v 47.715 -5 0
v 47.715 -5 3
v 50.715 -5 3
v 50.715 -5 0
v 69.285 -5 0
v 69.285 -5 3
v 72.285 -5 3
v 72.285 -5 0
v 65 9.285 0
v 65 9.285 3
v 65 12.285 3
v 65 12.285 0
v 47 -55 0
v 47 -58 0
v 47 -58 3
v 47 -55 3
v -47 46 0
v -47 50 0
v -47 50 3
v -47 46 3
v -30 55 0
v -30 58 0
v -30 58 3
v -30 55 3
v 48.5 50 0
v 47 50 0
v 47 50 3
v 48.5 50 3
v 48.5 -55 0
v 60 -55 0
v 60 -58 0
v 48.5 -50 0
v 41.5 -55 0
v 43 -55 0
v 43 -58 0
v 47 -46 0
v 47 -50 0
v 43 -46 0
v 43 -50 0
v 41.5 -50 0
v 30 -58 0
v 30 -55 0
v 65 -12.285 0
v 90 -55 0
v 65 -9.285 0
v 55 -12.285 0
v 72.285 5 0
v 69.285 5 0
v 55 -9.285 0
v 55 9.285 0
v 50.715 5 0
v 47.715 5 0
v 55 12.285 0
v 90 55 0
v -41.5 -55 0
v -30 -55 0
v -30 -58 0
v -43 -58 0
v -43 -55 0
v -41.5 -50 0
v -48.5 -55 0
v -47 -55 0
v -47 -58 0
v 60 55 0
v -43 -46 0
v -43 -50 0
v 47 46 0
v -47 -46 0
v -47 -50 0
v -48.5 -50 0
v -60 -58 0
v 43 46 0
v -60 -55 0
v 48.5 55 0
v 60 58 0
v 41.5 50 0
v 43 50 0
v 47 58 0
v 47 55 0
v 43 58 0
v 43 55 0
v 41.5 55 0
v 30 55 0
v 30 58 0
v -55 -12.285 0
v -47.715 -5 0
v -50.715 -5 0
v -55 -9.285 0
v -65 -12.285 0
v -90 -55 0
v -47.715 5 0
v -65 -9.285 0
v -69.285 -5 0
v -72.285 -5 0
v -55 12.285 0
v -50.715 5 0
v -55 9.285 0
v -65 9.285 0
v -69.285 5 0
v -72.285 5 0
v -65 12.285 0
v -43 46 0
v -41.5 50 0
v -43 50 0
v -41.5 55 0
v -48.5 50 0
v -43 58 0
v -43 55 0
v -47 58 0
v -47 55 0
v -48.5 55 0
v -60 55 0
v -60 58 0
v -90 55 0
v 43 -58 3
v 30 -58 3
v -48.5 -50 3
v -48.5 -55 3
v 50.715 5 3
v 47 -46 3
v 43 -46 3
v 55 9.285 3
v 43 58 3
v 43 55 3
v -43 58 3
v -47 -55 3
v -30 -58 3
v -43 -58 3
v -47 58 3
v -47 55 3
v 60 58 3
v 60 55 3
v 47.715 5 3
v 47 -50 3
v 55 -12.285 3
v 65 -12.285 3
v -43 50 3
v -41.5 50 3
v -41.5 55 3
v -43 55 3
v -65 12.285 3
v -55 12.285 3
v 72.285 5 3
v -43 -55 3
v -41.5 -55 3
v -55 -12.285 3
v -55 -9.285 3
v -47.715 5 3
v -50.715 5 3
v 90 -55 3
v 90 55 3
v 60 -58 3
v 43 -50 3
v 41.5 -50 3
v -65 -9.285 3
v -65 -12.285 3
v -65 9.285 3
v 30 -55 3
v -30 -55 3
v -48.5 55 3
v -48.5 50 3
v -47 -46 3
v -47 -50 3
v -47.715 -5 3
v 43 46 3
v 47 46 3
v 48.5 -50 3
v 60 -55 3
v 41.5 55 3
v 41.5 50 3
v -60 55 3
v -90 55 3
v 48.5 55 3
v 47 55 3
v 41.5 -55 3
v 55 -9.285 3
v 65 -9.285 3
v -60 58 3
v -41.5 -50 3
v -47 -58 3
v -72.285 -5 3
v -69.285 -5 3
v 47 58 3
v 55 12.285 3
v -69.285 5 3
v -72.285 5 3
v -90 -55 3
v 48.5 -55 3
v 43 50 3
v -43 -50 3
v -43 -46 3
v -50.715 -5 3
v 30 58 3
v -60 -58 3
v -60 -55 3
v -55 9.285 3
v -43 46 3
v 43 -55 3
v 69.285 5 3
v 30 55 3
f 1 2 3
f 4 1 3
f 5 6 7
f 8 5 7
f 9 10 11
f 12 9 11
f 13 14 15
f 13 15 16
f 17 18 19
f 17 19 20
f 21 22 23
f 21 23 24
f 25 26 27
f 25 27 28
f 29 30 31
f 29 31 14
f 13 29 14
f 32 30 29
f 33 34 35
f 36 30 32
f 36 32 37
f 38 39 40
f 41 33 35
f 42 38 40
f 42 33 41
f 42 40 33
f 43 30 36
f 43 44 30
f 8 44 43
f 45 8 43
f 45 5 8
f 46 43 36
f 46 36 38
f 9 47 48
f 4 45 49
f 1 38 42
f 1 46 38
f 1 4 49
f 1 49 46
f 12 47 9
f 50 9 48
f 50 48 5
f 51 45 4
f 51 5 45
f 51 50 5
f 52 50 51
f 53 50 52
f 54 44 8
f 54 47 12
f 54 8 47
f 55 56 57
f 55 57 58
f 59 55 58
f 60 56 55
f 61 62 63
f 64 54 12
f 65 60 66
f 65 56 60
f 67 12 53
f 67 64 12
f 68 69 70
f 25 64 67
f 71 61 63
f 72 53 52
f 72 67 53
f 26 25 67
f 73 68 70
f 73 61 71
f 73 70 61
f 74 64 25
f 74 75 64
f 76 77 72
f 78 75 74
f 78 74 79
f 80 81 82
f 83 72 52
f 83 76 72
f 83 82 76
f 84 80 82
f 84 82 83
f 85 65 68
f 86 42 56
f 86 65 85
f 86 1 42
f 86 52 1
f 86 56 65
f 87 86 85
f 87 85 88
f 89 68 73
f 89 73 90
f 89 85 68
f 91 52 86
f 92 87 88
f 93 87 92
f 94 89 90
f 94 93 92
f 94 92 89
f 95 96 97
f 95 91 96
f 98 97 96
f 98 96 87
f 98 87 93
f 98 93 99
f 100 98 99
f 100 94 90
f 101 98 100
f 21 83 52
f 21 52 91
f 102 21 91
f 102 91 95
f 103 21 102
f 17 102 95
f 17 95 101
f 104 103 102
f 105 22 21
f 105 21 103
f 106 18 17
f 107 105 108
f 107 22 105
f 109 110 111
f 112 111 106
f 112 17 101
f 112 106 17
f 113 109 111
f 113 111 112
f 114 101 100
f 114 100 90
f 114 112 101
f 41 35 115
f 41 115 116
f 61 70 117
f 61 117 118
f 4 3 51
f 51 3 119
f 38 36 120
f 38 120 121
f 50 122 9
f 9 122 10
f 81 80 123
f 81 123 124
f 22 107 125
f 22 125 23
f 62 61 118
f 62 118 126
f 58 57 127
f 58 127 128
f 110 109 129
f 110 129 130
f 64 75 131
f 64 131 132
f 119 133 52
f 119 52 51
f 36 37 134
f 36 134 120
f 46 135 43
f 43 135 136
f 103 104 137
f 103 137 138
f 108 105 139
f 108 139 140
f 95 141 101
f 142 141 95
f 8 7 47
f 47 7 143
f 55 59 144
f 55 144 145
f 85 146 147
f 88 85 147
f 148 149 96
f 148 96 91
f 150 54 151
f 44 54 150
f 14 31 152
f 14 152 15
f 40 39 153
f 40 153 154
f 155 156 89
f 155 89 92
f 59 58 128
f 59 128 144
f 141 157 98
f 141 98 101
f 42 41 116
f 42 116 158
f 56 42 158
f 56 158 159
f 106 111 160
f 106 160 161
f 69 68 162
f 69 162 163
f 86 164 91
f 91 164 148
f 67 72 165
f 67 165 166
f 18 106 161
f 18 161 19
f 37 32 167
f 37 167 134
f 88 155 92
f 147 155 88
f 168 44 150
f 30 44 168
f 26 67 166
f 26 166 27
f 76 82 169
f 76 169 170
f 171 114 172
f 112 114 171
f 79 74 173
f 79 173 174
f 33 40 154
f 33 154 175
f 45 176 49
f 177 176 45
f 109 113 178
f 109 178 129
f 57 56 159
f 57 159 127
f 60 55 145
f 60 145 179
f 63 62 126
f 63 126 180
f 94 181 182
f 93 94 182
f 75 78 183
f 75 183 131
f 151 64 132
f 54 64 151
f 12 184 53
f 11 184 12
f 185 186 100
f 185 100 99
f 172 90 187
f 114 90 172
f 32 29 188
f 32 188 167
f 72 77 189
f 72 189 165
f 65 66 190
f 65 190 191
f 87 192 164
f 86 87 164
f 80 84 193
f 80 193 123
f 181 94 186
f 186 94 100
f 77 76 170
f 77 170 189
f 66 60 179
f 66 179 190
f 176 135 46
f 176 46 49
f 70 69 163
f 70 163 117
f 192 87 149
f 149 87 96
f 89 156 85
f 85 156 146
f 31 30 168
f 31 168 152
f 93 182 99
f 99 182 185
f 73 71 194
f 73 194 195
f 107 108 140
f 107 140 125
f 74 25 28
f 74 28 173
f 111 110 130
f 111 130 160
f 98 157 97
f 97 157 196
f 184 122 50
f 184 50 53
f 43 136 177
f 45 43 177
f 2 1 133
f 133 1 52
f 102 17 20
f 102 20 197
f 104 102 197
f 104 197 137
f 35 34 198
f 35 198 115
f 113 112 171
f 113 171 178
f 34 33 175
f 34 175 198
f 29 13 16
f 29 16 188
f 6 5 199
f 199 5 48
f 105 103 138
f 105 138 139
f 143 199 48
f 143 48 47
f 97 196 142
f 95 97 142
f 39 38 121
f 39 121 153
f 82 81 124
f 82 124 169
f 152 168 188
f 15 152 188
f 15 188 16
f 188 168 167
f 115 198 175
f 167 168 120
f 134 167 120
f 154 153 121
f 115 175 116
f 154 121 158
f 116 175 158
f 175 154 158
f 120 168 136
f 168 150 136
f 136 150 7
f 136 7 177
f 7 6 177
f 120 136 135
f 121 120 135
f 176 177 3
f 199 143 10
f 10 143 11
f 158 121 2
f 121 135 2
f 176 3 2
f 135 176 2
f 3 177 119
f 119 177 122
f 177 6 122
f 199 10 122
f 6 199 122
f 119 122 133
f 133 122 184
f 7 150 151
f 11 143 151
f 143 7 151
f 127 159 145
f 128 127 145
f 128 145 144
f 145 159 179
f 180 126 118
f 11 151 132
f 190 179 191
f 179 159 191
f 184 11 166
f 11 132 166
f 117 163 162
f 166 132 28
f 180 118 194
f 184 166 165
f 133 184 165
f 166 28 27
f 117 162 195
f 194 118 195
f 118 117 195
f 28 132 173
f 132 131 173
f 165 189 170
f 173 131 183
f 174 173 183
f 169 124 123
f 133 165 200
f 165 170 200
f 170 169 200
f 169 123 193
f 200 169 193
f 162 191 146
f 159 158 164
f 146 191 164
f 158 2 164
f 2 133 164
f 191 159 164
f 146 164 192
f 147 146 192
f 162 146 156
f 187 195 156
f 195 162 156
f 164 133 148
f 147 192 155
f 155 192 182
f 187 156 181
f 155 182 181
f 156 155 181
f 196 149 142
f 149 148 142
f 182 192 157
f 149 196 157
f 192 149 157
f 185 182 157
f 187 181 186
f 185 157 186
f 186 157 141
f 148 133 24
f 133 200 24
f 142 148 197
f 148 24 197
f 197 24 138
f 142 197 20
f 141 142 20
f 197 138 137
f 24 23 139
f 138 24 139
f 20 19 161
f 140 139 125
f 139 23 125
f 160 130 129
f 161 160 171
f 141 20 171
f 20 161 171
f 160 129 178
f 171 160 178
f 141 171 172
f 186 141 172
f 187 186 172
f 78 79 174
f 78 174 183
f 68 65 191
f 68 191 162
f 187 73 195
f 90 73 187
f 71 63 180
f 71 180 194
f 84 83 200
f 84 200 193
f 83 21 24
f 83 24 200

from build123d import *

# Parameters (mm, degrees)
SKETCH1_W                 = 3
SKETCH1_H                 = 3
PLATE_THICKNESS_3MM_DEPTH = 3
SKETCH_1_W                = 10
SKETCH_1_H                = 3
SKETCH_1_W_2              = 3
SKETCH_1_H_2              = 5
CUT_EXTRUDE_1_DEPTH       = 3


with BuildPart() as part:
    # Sketch1 → Plate_thickness_3mm (new body)
    with BuildSketch(Plane.XY):
        Polygon((30, -55), (-30, -55), (-30, -58), (-43, -58), (-43, -55), (-41.5, -55), (-41.5, -50), (-43, -50), (-43, -46), (-47, -46), (-47, -50), (-48.5, -50), (-48.5, -55), (-47, -55), (-47, -58), (-60, -58), (-60, -55), (-90, -55), (-90, 55), (-60, 55), (-60, 58), (-47, 58), (-47, 55), (-48.5, 55), (-48.5, 50), (-47, 50), (-47, 46), (-43, 46), (-43, 50), (-41.5, 50), (-41.5, 55), (-43, 55), (-43, 58), (-30, 58), (-30, 55), (30, 55), (30, 58), (43, 58), (43, 55), (41.5, 55), (41.5, 50), (43, 50), (43, 46), (47, 46), (47, 50), (48.5, 50), (48.5, 55), (47, 55), (47, 58), (60, 58), (60, 55), (90, 55), (90, -55), (60, -55), (60, -58), (47, -58), (47, -55), (48.5, -55), (48.5, -50), (47, -50), (47, -46), (43, -46), (43, -50), (41.5, -50), (41.5, -55), (43, -55), (43, -58), (30, -58), align=None)
        with Locations((-60, -10.785)):
            Rectangle(SKETCH1_W, SKETCH1_H, mode=Mode.SUBTRACT)
        with Locations((60, -10.785)):
            Rectangle(SKETCH1_W, SKETCH1_H, mode=Mode.SUBTRACT)
        with Locations((-70.785, 0)):
            Rectangle(SKETCH1_W, SKETCH1_H, mode=Mode.SUBTRACT)
        with Locations((-49.215, 0)):
            Rectangle(SKETCH1_W, SKETCH1_H, mode=Mode.SUBTRACT)
        with Locations((-60, 10.785)):
            Rectangle(SKETCH1_W, SKETCH1_H, mode=Mode.SUBTRACT)
        with Locations((49.215, 0)):
            Rectangle(SKETCH1_W, SKETCH1_H, mode=Mode.SUBTRACT)
        with Locations((70.785, 0)):
            Rectangle(SKETCH1_W, SKETCH1_H, mode=Mode.SUBTRACT)
        with Locations((60, 10.785)):
            Rectangle(SKETCH1_W, SKETCH1_H, mode=Mode.SUBTRACT)
    extrude(amount=PLATE_THICKNESS_3MM_DEPTH)

    # 草图1 → 切除-拉伸1 (cut)
    with BuildSketch(Plane.XY.offset(3)):
        with Locations((-60, -10.785)):
            Rectangle(SKETCH_1_W, SKETCH_1_H)
        with Locations((-70.785, -2.5)):
            Rectangle(SKETCH_1_W_2, SKETCH_1_H_2)
        with Locations((-70.785, 2.5)):
            Rectangle(SKETCH_1_W_2, SKETCH_1_H_2)
        with Locations((-49.215, 2.5)):
            Rectangle(SKETCH_1_W_2, SKETCH_1_H_2)
        with Locations((-49.215, -2.5)):
            Rectangle(SKETCH_1_W_2, SKETCH_1_H_2)
        with Locations((-60, 10.785)):
            Rectangle(SKETCH_1_W, SKETCH_1_H)
        with Locations((60, 10.785)):
            Rectangle(SKETCH_1_W, SKETCH_1_H)
        with Locations((49.215, 2.5)):
            Rectangle(SKETCH_1_W_2, SKETCH_1_H_2)
        with Locations((49.215, -2.5)):
            Rectangle(SKETCH_1_W_2, SKETCH_1_H_2)
        with Locations((60, -10.785)):
            Rectangle(SKETCH_1_W, SKETCH_1_H)
        with Locations((70.785, -2.5)):
            Rectangle(SKETCH_1_W_2, SKETCH_1_H_2)
        with Locations((70.785, 2.5)):
            Rectangle(SKETCH_1_W_2, SKETCH_1_H_2)
    extrude(amount=-CUT_EXTRUDE_1_DEPTH, mode=Mode.SUBTRACT)


solid = part.part
